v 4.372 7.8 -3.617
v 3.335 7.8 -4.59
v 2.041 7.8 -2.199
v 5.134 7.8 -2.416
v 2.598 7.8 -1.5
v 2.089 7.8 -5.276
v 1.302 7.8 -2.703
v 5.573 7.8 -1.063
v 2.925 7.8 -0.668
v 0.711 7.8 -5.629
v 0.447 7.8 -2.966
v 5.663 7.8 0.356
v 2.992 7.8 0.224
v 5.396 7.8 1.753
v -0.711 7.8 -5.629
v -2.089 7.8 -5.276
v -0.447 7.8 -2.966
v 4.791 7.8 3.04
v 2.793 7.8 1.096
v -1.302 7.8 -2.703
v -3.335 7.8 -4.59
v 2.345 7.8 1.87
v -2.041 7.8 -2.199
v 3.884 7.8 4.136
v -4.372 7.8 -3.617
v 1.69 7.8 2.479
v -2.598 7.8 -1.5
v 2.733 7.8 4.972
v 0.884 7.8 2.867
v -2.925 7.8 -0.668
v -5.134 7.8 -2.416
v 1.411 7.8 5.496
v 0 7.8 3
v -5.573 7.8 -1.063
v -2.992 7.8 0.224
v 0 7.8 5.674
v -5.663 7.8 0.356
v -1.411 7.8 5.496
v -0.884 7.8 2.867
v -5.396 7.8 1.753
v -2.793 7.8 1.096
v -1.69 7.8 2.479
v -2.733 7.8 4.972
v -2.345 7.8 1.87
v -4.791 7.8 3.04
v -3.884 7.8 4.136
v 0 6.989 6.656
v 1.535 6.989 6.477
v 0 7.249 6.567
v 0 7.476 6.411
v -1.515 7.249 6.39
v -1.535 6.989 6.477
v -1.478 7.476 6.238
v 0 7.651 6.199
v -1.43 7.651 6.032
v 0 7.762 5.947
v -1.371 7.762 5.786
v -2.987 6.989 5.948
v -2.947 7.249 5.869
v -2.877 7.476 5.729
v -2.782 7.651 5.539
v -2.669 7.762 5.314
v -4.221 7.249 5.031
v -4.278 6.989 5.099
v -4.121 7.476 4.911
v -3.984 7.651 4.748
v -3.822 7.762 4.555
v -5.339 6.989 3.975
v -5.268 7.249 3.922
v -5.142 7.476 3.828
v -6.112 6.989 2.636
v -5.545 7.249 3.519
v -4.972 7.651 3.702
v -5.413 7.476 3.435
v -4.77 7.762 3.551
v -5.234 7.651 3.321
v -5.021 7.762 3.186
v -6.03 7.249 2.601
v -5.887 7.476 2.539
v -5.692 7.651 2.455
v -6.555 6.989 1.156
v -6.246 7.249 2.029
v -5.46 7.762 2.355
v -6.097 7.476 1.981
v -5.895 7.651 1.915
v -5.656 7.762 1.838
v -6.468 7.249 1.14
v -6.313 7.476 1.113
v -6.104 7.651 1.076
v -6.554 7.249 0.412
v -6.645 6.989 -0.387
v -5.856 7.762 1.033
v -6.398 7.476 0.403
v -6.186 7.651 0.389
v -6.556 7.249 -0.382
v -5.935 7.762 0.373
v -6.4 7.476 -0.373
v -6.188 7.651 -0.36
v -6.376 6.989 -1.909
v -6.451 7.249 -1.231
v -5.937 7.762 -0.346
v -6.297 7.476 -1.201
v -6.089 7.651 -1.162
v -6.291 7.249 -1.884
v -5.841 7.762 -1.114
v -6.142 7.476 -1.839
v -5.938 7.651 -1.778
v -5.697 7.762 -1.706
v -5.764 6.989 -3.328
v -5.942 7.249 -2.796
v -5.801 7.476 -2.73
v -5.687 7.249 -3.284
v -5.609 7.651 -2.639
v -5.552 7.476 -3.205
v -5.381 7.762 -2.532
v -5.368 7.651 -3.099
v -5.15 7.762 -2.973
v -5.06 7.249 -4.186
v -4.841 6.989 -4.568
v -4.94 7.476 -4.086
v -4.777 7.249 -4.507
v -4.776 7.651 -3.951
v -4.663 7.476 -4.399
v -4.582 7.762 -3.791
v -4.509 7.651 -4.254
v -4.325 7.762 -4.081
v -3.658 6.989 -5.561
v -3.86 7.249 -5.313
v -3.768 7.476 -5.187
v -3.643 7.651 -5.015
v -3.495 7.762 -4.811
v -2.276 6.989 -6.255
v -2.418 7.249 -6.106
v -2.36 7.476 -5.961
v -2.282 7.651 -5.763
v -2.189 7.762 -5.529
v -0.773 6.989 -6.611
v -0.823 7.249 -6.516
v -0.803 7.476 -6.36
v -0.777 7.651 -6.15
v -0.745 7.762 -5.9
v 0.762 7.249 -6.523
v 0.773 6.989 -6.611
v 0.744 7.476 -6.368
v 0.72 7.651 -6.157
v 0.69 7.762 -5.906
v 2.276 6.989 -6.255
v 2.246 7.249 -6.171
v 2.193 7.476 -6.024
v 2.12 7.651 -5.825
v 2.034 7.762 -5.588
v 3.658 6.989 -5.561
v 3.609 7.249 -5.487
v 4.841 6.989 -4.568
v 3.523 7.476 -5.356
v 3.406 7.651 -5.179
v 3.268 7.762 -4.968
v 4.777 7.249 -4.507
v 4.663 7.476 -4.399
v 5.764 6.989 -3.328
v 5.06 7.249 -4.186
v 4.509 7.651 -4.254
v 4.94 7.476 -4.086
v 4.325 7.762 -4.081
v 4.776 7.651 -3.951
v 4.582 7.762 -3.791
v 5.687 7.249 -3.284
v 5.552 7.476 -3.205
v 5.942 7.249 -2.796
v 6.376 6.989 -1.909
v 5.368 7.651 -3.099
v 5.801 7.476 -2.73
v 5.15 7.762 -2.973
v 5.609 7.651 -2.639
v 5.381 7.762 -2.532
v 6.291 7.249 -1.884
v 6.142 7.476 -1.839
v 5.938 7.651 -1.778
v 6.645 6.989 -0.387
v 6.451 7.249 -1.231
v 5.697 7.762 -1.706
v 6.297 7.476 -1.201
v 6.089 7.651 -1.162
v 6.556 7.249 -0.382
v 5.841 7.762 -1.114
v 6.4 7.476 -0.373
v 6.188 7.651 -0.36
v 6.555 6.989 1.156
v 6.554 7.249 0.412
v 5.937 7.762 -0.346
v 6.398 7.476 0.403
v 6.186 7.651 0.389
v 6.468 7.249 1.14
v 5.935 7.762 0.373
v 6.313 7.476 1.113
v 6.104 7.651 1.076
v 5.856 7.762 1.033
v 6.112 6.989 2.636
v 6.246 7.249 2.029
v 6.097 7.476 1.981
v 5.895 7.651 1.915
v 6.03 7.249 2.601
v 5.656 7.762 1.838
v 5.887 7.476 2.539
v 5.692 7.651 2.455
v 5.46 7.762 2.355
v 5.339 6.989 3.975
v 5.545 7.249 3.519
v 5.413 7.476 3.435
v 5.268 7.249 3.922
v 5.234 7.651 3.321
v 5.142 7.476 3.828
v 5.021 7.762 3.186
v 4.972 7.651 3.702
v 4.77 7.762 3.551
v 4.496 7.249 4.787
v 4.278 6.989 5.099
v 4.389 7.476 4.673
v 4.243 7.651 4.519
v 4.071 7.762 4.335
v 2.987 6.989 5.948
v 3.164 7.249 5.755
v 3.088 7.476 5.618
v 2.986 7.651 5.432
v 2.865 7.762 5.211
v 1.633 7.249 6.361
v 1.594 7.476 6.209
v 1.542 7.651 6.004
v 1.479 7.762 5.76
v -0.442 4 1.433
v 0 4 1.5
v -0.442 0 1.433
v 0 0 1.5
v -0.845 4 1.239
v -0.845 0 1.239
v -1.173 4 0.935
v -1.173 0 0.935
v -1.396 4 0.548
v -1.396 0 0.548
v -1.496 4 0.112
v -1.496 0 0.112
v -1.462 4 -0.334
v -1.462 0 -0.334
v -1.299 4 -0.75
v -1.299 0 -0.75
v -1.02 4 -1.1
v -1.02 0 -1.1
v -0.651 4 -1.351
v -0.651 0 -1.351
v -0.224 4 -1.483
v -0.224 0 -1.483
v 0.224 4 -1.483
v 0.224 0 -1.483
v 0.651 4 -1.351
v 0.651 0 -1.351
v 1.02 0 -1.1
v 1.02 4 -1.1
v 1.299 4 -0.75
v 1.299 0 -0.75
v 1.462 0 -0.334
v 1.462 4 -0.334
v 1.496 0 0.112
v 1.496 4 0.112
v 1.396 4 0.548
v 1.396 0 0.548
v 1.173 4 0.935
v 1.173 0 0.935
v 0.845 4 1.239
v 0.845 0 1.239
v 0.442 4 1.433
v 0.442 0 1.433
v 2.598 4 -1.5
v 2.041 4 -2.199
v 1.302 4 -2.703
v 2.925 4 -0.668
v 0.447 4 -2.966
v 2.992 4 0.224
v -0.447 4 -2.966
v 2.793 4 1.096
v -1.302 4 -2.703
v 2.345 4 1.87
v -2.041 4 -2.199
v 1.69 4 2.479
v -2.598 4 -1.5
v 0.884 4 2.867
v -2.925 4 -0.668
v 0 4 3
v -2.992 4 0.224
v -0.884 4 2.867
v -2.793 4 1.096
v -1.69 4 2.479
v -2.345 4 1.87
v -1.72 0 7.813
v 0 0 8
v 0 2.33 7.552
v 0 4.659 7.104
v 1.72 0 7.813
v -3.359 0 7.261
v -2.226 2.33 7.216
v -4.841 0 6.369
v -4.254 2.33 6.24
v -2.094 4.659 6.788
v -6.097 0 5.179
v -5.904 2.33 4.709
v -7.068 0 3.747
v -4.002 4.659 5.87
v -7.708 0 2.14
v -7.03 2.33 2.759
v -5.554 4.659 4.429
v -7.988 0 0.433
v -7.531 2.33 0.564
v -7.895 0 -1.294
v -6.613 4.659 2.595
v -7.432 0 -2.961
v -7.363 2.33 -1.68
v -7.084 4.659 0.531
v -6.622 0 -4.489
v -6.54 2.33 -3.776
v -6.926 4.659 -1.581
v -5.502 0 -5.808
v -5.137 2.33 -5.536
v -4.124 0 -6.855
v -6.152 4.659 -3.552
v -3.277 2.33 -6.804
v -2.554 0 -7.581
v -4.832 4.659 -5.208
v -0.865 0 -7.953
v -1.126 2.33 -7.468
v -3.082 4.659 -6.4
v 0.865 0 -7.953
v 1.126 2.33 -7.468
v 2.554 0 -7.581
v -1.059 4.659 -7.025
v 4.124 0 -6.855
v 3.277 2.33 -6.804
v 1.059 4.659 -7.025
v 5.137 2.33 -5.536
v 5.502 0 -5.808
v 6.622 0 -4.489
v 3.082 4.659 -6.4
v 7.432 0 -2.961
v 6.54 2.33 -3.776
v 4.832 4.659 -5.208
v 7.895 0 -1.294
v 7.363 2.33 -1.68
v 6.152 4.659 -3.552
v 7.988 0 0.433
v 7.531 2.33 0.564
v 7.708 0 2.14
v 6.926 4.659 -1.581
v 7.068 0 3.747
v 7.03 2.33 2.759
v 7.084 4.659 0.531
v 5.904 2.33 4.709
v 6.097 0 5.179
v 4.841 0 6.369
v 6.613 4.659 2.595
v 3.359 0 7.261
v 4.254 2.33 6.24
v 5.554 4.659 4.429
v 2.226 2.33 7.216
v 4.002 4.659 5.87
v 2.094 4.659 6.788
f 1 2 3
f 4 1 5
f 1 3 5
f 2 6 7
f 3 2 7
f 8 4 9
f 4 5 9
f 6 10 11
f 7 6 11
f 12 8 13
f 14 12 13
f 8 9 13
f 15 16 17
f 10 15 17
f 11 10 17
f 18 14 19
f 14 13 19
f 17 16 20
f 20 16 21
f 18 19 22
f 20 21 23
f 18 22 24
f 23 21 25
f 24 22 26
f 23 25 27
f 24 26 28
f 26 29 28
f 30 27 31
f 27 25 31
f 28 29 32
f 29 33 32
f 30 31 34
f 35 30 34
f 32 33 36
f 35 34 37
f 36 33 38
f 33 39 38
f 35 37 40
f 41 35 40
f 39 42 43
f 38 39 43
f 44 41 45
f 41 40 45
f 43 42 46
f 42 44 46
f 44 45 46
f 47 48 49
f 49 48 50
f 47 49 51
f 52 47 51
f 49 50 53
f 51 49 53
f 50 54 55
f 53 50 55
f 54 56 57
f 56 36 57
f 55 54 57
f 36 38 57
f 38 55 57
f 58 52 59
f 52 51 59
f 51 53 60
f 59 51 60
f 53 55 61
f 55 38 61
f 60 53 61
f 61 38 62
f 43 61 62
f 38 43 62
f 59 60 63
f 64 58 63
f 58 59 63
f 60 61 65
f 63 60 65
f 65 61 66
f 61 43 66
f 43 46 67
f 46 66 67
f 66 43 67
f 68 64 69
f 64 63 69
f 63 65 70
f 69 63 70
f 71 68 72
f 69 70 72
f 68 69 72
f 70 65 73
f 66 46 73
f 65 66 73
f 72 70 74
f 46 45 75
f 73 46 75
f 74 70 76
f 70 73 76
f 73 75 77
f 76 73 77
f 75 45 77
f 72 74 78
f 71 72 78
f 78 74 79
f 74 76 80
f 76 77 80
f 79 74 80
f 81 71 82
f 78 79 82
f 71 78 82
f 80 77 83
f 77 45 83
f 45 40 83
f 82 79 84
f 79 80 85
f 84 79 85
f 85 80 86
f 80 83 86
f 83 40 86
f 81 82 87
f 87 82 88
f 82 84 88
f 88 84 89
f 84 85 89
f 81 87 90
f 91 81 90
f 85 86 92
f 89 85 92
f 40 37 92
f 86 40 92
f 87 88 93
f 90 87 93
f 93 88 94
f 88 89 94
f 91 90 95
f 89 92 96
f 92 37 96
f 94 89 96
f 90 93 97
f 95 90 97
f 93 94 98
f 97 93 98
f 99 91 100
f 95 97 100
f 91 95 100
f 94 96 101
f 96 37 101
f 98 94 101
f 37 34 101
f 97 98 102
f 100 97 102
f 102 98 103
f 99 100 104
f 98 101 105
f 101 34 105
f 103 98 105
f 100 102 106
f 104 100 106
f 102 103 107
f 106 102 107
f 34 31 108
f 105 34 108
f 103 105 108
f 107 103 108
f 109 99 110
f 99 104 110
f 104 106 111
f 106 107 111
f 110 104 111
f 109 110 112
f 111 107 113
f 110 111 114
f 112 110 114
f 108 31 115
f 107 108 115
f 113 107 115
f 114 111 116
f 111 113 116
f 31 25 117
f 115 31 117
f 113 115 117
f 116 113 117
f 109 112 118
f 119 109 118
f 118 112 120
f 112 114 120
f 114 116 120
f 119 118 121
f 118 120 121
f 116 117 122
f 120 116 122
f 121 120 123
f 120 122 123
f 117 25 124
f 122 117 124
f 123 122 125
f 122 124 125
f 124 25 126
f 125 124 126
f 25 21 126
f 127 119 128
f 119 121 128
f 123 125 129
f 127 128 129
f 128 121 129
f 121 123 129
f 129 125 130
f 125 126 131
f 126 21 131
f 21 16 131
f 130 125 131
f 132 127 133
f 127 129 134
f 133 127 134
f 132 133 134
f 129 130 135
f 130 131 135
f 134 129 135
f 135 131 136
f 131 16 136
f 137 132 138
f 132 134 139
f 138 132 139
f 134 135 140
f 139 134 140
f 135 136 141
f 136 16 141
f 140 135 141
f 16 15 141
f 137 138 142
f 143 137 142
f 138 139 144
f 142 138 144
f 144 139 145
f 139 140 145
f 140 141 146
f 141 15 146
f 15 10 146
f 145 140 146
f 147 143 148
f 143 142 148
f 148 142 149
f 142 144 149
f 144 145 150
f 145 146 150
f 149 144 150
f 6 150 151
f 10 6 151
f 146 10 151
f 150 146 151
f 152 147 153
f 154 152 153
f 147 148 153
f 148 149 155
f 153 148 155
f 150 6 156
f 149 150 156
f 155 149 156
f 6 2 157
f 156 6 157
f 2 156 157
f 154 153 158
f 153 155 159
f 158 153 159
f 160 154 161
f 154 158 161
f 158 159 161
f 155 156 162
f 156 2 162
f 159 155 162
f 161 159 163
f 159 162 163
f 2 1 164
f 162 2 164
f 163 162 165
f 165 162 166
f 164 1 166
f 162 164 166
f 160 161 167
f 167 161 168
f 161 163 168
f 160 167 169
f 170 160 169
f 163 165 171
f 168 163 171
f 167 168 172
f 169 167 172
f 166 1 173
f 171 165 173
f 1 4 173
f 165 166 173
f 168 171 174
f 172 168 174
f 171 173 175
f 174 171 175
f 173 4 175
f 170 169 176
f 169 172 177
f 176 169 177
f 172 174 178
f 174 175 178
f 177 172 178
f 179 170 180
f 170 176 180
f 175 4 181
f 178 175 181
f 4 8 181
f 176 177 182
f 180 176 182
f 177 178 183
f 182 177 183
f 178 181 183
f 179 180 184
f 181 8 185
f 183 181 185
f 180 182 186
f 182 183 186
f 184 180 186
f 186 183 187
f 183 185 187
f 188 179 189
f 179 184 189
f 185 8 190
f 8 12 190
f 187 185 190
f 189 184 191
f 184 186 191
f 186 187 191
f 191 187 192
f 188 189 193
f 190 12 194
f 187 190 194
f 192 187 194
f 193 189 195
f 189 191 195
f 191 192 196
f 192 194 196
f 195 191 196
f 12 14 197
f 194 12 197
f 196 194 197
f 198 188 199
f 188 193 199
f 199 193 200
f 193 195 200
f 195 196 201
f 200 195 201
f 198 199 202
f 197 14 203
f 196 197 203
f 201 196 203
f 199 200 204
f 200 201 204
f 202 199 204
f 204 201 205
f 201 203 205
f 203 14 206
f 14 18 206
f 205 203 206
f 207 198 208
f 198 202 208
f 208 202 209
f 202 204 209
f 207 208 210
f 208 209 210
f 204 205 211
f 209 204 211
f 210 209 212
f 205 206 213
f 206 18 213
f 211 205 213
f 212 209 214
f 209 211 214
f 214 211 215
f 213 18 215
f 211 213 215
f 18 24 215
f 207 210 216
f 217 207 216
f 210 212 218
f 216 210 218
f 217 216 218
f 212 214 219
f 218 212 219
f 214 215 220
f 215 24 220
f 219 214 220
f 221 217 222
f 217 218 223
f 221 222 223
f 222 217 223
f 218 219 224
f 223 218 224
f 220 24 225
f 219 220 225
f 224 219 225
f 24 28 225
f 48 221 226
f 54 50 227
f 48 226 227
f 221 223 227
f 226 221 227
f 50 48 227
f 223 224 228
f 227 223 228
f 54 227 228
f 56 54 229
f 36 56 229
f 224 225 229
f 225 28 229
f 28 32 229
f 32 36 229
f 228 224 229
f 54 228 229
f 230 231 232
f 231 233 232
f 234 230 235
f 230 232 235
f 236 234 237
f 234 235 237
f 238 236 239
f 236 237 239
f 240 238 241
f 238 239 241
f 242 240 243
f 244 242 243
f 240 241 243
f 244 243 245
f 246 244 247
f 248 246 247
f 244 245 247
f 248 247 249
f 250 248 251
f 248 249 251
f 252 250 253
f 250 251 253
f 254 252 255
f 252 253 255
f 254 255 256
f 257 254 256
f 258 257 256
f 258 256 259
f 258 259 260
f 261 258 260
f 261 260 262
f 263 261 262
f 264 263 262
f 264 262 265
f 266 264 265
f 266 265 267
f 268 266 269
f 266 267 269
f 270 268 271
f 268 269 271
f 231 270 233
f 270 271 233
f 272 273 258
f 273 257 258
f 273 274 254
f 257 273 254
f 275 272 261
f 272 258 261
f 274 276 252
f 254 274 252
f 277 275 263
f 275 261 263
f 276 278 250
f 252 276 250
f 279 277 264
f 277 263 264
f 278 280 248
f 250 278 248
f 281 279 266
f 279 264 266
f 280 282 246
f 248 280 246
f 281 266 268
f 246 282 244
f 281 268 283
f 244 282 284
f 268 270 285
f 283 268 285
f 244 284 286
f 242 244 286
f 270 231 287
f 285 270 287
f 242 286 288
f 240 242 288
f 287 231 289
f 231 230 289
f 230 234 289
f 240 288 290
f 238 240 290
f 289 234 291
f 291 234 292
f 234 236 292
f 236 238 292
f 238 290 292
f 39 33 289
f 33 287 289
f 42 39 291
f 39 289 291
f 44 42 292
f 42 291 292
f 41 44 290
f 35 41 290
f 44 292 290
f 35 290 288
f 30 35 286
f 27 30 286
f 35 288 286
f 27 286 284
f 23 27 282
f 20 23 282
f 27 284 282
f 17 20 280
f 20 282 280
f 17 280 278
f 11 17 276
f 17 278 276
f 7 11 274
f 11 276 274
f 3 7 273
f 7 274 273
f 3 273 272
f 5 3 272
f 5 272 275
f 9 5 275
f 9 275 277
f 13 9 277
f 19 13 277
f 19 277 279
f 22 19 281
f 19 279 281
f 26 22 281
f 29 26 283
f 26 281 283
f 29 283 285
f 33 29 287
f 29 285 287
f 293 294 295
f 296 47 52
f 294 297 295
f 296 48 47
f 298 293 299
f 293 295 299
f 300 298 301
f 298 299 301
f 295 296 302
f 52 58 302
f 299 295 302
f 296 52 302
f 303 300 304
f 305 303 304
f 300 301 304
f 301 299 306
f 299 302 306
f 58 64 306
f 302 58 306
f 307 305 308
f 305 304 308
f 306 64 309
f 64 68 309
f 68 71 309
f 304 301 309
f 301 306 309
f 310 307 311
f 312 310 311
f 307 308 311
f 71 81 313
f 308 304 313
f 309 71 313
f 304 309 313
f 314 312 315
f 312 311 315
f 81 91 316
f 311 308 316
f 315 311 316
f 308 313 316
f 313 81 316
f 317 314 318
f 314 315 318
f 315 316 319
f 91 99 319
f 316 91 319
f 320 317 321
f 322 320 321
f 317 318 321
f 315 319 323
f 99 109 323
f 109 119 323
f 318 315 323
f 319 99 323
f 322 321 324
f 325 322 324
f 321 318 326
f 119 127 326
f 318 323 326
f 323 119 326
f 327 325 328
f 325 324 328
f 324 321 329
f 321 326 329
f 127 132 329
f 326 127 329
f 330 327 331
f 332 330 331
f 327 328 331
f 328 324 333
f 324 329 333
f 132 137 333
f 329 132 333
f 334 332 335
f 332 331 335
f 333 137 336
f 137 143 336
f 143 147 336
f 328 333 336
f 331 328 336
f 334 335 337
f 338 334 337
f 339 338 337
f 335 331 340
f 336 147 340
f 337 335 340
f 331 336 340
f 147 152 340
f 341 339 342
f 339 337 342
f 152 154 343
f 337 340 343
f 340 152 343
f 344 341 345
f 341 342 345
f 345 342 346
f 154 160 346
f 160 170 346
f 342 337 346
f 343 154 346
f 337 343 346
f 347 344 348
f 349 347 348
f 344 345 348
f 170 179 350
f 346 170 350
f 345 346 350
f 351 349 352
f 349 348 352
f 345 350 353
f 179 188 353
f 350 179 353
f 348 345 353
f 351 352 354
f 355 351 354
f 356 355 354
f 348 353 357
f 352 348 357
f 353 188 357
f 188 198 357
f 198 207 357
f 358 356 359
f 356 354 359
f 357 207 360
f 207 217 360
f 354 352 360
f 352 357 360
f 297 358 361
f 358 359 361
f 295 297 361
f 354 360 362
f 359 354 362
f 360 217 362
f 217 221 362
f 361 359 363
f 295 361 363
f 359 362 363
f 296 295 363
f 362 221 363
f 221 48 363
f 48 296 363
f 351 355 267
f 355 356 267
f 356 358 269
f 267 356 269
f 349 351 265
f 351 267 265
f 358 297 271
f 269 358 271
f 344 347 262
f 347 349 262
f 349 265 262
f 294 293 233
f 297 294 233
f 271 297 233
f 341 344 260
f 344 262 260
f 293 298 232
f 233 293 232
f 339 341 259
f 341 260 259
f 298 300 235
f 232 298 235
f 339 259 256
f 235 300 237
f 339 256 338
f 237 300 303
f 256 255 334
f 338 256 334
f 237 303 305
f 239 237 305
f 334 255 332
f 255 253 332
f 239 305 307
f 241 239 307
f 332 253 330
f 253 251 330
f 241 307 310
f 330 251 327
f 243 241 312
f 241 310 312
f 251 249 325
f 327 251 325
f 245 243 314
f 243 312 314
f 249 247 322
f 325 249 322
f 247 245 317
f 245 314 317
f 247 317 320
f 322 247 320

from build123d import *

# Parameters (mm, degrees)
ZAOBLIT1_R = 1


with BuildPart() as part:
    # Skica1 → Rotovat1 (revolve)
    with BuildSketch(Plane.XY, mode=Mode.PRIVATE) as rotovat1_sk:
        Polygon((-1.5, 0), (-8, 0), (-6.5, 7.8), (-3, 7.8), (-3, 4), (-1.5, 4), align=None)
    revolve(rotovat1_sk.sketch.rotate(Axis((0, 16.170731707, 0), (0, -1, 0)), 270), axis=Axis((0, 16.170731707, 0), (0, -1, 0)))

    # Zaoblit1
    zaoblit1_edges = [part.edges().sort_by_distance(p)[0] for p in [
        (0, 7.8, -6.5),
    ]]
    fillet(zaoblit1_edges, radius=ZAOBLIT1_R)


solid = part.part
